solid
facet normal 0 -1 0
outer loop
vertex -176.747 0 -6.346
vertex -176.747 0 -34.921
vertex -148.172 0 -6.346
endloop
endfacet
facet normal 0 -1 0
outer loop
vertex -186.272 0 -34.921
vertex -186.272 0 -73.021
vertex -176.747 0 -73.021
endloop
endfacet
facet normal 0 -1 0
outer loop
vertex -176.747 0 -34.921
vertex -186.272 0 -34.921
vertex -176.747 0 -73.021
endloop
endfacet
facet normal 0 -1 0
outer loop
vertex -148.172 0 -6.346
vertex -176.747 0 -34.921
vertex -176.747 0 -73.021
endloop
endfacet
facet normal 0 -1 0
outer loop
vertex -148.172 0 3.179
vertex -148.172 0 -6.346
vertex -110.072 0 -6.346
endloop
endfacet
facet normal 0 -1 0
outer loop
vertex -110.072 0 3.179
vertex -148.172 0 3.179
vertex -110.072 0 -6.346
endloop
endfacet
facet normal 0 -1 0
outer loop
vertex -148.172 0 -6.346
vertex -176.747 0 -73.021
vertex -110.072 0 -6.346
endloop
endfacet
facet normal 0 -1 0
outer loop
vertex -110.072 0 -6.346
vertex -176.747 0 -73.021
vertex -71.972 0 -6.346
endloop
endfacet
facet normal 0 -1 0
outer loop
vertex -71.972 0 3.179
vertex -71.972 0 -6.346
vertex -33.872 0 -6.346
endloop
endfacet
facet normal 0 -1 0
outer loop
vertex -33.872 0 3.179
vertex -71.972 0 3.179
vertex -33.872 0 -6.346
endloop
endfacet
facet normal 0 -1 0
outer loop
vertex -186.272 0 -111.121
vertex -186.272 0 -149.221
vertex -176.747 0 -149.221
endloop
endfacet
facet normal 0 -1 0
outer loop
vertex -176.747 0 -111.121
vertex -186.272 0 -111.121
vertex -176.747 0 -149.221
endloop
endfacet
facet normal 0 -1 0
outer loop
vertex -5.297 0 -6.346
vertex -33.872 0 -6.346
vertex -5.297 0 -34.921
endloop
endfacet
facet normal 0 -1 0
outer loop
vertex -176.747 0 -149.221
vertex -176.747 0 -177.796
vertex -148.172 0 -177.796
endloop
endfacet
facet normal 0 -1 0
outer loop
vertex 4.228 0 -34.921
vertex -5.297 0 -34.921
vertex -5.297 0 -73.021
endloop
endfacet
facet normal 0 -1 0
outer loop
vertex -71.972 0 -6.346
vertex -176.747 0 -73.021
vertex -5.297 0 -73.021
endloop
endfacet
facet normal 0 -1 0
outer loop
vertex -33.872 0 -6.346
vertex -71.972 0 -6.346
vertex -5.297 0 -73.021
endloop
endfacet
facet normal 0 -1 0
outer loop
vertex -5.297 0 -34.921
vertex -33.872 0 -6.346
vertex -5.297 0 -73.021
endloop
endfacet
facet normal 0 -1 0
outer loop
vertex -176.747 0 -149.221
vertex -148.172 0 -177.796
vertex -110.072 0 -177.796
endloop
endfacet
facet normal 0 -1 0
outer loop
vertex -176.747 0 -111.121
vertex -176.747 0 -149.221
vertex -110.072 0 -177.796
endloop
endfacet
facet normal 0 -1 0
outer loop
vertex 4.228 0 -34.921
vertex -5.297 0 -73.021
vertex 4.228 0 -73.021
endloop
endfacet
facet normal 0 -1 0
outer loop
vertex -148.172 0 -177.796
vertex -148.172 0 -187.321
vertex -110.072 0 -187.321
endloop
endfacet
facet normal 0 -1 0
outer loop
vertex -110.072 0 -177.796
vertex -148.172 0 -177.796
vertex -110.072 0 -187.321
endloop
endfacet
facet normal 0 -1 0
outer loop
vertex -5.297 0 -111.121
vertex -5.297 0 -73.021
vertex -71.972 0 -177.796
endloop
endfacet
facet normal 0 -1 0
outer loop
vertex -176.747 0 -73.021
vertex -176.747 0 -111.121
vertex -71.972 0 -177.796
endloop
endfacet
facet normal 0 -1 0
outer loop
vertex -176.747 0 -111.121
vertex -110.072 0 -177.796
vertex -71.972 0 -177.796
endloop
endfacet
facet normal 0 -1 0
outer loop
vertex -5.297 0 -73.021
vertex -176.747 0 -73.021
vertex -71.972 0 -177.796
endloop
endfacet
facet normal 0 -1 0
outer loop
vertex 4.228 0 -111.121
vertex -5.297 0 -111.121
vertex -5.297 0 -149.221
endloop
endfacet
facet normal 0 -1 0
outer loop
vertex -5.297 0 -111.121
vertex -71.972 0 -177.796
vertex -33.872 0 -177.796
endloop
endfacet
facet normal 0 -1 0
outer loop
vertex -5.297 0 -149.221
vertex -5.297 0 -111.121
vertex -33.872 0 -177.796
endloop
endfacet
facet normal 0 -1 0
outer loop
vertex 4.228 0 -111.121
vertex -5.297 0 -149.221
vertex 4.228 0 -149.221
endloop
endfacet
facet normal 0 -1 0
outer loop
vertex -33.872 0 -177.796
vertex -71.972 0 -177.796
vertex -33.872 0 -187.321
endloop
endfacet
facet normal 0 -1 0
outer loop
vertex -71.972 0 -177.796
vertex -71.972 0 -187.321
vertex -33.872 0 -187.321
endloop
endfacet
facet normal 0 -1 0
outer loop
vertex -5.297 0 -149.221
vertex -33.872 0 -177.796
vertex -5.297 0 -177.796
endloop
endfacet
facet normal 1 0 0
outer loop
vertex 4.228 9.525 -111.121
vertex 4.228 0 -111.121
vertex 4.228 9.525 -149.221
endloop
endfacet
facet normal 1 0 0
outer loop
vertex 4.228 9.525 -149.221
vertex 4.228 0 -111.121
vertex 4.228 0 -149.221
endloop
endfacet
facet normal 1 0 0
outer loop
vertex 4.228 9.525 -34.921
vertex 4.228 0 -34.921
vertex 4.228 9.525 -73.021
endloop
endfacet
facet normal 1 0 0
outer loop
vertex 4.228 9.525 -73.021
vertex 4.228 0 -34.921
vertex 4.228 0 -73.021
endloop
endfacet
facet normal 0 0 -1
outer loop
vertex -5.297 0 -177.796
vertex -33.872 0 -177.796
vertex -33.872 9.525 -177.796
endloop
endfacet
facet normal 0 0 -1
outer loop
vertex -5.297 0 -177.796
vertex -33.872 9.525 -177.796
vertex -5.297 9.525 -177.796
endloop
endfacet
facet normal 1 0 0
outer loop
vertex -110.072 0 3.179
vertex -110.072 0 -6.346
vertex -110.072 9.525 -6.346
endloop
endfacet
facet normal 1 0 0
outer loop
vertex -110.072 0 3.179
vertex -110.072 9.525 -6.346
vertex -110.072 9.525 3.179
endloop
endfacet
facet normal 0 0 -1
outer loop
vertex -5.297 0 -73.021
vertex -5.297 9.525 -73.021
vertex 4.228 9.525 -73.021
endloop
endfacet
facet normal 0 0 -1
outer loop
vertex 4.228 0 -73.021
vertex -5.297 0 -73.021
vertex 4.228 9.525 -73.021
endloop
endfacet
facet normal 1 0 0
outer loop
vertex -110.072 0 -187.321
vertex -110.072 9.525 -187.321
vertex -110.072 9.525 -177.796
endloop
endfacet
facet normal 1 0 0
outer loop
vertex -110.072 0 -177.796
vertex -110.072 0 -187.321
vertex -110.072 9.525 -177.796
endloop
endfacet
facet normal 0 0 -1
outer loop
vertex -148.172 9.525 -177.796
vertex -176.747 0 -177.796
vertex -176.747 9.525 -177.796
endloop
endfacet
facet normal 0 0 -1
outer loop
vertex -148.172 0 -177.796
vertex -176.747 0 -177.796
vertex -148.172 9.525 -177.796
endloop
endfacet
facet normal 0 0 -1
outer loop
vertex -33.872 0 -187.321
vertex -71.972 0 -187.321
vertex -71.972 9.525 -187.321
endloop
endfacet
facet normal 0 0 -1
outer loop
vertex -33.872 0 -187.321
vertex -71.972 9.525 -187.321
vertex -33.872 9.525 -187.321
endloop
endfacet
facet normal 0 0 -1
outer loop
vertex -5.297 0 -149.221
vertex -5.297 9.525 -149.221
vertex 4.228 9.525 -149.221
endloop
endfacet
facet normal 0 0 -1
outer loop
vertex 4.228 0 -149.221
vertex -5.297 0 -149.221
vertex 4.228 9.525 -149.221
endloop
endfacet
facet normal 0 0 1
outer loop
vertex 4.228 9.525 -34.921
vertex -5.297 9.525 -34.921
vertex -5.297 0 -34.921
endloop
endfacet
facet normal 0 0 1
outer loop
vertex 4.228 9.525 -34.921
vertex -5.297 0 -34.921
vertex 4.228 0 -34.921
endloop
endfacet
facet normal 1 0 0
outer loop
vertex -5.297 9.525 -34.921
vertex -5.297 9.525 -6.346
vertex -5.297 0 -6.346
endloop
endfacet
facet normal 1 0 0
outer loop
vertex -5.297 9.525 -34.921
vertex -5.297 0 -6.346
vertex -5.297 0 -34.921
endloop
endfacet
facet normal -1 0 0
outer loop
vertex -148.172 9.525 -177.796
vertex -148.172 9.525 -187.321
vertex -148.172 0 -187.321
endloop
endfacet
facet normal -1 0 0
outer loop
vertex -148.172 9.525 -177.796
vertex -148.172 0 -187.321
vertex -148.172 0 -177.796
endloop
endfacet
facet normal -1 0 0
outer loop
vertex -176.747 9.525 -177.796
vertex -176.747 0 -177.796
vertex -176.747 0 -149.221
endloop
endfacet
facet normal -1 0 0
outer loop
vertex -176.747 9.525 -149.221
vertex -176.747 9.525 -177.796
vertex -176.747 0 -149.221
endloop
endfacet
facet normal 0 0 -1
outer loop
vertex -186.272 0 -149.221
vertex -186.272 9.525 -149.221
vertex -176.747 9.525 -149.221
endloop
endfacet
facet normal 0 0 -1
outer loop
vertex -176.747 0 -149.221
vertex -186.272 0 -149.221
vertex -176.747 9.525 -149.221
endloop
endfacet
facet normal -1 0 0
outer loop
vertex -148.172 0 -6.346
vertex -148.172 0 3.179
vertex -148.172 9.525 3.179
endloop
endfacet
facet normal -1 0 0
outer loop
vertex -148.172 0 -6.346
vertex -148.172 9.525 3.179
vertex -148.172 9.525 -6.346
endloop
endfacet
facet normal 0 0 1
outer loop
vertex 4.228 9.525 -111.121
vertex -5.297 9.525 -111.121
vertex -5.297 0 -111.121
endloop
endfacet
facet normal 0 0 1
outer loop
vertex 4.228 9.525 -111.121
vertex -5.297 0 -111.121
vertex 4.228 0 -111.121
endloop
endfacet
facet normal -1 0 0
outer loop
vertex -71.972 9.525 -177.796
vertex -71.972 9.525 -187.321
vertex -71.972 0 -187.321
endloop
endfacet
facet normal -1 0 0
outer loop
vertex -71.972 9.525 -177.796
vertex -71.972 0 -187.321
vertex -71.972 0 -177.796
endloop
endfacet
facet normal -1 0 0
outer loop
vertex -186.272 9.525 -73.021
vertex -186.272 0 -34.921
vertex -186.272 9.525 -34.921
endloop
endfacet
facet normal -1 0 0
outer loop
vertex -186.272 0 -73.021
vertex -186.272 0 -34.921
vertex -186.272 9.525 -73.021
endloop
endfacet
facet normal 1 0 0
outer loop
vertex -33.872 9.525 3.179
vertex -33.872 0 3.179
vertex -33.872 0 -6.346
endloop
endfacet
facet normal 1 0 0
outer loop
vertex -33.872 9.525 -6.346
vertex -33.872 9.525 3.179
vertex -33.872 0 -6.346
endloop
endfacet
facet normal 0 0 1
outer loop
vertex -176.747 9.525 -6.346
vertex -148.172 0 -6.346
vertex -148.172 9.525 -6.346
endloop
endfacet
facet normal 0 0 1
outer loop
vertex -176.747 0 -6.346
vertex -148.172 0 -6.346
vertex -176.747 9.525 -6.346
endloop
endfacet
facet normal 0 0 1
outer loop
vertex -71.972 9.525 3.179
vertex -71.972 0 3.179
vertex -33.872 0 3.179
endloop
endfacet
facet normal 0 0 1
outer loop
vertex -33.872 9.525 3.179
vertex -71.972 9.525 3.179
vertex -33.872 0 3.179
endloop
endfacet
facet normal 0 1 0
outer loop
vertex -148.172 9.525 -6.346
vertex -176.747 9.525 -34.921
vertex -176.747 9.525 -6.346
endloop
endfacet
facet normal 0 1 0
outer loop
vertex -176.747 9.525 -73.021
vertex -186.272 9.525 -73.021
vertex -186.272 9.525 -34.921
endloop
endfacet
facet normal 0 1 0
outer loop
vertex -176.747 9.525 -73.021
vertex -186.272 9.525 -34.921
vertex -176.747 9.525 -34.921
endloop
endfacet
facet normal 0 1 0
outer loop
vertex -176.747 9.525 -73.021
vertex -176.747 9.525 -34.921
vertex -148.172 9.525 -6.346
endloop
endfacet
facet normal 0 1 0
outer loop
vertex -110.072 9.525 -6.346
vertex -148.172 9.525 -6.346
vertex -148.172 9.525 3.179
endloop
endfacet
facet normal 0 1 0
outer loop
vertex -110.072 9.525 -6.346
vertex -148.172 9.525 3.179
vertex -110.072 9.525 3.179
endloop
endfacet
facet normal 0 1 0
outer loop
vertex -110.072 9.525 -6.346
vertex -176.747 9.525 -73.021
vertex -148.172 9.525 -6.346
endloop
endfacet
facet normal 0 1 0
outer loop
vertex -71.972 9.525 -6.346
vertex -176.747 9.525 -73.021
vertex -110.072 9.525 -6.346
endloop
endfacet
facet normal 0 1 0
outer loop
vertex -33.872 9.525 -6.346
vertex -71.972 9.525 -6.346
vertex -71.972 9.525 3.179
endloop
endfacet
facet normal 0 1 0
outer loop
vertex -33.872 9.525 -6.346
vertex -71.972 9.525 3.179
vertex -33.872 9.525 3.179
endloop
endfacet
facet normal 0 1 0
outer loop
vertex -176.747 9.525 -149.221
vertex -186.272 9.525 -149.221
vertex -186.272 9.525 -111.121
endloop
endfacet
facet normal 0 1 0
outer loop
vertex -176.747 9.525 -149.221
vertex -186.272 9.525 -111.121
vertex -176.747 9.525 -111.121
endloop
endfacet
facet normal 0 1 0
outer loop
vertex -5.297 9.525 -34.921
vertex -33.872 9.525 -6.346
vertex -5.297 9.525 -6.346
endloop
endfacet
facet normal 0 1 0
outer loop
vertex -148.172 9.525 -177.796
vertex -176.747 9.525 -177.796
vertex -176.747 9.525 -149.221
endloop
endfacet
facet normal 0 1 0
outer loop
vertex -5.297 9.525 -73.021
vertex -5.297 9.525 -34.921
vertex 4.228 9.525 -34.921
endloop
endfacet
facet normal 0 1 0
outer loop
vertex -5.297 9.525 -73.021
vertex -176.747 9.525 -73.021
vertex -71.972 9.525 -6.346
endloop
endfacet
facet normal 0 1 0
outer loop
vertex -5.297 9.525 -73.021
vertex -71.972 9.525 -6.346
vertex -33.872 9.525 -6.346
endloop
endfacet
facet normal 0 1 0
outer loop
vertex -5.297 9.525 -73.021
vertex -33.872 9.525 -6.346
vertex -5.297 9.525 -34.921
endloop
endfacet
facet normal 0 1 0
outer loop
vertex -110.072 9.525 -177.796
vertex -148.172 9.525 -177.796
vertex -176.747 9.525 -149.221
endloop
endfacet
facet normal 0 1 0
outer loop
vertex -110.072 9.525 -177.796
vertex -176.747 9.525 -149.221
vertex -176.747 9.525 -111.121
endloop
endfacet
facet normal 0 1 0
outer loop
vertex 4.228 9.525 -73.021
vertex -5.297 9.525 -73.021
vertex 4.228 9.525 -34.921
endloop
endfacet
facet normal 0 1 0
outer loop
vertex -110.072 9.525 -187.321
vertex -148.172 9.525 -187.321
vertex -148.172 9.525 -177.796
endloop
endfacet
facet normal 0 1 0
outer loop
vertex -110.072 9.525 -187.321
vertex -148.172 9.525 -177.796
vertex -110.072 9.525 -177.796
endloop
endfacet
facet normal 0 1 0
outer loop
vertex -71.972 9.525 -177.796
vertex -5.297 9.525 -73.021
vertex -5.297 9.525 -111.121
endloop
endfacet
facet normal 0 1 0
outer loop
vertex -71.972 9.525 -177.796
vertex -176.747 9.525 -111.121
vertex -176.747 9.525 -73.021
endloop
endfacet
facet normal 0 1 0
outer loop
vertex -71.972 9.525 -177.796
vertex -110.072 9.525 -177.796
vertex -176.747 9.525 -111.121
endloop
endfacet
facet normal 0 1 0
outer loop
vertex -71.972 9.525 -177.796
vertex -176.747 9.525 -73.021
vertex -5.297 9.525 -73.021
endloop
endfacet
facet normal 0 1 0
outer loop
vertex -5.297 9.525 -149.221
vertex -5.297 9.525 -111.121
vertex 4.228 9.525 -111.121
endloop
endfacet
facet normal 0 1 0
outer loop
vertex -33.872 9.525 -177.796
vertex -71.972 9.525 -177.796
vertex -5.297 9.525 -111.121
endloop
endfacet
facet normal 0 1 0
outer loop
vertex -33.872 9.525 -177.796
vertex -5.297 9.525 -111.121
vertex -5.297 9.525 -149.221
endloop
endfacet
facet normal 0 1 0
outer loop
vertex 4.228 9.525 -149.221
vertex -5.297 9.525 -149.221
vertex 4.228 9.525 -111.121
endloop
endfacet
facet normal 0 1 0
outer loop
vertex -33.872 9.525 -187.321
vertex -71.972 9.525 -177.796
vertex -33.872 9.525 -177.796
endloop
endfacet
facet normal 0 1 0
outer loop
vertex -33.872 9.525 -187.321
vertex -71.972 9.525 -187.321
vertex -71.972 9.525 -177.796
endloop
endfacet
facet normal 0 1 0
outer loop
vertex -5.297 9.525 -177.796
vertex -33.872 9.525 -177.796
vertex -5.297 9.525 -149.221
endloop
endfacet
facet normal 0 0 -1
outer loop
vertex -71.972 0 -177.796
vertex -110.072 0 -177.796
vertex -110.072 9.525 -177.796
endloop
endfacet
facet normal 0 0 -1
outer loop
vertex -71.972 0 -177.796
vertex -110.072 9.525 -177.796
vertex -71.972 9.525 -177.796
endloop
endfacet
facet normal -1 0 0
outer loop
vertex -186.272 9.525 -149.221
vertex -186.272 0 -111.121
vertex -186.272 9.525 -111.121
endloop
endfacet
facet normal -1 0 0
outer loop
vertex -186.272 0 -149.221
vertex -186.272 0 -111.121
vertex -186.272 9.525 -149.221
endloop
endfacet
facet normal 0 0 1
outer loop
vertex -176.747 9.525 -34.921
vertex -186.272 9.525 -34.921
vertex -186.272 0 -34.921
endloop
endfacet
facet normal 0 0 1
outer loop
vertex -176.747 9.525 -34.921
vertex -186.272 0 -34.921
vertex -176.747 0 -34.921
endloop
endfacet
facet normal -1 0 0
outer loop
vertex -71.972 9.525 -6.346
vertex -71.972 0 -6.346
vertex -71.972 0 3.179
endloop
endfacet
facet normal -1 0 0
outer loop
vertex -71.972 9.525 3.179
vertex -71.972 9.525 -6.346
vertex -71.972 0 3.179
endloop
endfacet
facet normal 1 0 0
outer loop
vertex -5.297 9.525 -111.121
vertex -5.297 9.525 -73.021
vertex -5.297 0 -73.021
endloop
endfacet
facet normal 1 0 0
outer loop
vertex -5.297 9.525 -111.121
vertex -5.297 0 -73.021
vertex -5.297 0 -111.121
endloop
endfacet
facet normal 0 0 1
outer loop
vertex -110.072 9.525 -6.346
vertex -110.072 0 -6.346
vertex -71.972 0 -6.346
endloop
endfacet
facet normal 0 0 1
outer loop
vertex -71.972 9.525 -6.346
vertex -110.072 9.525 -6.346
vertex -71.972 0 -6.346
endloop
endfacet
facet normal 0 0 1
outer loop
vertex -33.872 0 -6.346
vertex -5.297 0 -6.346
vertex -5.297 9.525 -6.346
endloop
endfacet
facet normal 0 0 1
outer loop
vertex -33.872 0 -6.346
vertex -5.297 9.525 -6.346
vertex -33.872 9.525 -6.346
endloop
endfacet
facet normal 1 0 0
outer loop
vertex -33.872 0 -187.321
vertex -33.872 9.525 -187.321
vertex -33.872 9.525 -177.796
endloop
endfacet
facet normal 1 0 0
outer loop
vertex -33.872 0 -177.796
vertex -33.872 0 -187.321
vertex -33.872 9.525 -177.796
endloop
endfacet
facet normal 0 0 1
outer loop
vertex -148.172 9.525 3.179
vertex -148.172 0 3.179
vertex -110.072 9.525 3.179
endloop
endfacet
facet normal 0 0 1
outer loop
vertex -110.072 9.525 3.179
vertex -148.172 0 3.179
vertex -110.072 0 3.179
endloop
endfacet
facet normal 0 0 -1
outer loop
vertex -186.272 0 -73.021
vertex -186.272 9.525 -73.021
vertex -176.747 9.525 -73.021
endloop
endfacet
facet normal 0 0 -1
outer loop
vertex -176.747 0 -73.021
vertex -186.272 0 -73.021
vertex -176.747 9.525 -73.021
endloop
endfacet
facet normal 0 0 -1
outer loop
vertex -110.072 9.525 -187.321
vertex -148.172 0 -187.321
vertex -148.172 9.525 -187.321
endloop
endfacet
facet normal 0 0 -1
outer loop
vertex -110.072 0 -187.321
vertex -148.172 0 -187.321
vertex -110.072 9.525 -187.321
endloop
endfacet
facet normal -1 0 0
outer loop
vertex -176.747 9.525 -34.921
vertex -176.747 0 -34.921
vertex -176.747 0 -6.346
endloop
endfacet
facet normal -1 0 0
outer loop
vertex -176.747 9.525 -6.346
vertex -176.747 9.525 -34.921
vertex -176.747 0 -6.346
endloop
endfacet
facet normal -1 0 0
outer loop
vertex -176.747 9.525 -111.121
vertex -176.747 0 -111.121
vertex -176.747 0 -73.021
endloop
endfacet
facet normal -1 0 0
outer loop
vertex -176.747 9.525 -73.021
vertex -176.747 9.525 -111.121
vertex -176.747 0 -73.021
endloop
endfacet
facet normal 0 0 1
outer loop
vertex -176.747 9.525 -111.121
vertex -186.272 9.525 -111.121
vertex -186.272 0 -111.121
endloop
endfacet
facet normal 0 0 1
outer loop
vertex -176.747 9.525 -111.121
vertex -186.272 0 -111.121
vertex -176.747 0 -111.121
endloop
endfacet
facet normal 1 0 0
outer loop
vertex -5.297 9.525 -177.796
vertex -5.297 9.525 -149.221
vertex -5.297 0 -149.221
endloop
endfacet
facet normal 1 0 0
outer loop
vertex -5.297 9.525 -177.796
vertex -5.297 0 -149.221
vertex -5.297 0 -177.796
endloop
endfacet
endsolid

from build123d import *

# Parameters (mm, degrees)
SKETCH1_W           = 190.5
SKETCH1_H           = 190.5
BOSS_EXTRUDE1_DEPTH = 9.525
SKETCH2_W           = 9.525
SKETCH2_H           = 38.1
CUT_EXTRUDE1_DEPTH  = 9.525
SKETCH3_W           = 9.525
SKETCH3_H           = 38.1
CUT_EXTRUDE2_DEPTH  = 9.525
SKETCH4_W           = 9.525
SKETCH4_H           = 38.1
CUT_EXTRUDE3_DEPTH  = 9.525
SKETCH5_W           = 9.525
SKETCH5_H           = 38.1
CUT_EXTRUDE4_DEPTH  = 9.525
SKETCH6_W           = 9.525
SKETCH6_H           = 38.1
CUT_EXTRUDE5_DEPTH  = 9.525
SKETCH7_W           = 9.525
SKETCH7_H           = 38.1
CUT_EXTRUDE6_DEPTH  = 9.525
SKETCH8_W           = 28.575
SKETCH8_H           = 9.525
CUT_EXTRUDE7_DEPTH  = 9.525
SKETCH9_W           = 38.1
SKETCH9_H           = 9.525
CUT_EXTRUDE8_DEPTH  = 9.525
SKETCH10_W          = 28.575
SKETCH10_H          = 9.525
CUT_EXTRUDE9_DEPTH  = 9.525
SKETCH11_W          = 28.575
SKETCH11_H          = 9.525
CUT_EXTRUDE11_DEPTH = 9.525
SKETCH12_W          = 38.1
SKETCH12_H          = 9.525
CUT_EXTRUDE12_DEPTH = 9.525
SKETCH14_W          = 28.575
SKETCH14_H          = 9.525
CUT_EXTRUDE13_DEPTH = 9.525


with BuildPart() as part:
    # Sketch1 → Boss-Extrude1 (new body)
    with BuildSketch(Plane(origin=(0, 0, 0), x_dir=(1, 0, 0), z_dir=(0, 1, 0))):
        with Locations((-91.022160665, 92.07132964)):
            Rectangle(SKETCH1_W, SKETCH1_H)
    extrude(amount=BOSS_EXTRUDE1_DEPTH)

    # Sketch2 → Cut-Extrude1 (cut)
    with BuildSketch(Plane(origin=(0, 9.525, 0), x_dir=(1, 0, 0), z_dir=(0, 1, 0))):
        with Locations((-0.534660665, 15.87132964)):
            Rectangle(SKETCH2_W, SKETCH2_H)
    extrude(amount=-CUT_EXTRUDE1_DEPTH, mode=Mode.SUBTRACT)

    # Sketch3 → Cut-Extrude2 (cut)
    with BuildSketch(Plane(origin=(0, 9.525, 0), x_dir=(1, 0, 0), z_dir=(0, 1, 0))):
        with Locations((-0.534660665, 92.07132964)):
            Rectangle(SKETCH3_W, SKETCH3_H)
    extrude(amount=-CUT_EXTRUDE2_DEPTH, mode=Mode.SUBTRACT)

    # Sketch4 → Cut-Extrude3 (cut)
    with BuildSketch(Plane(origin=(0, 9.525, 0), x_dir=(1, 0, 0), z_dir=(0, 1, 0))):
        with Locations((-0.534660665, 168.27132964)):
            Rectangle(SKETCH4_W, SKETCH4_H)
    extrude(amount=-CUT_EXTRUDE3_DEPTH, mode=Mode.SUBTRACT)

    # Sketch5 → Cut-Extrude4 (cut)
    with BuildSketch(Plane.XZ):
        with Locations((-181.509660665, -15.87132964)):
            Rectangle(SKETCH5_W, SKETCH5_H)
    extrude(amount=-CUT_EXTRUDE4_DEPTH, mode=Mode.SUBTRACT)

    # Sketch6 → Cut-Extrude5 (cut)
    with BuildSketch(Plane.XZ):
        with Locations((-181.509660665, -92.07132964)):
            Rectangle(SKETCH6_W, SKETCH6_H)
    extrude(amount=-CUT_EXTRUDE5_DEPTH, mode=Mode.SUBTRACT)

    # Sketch7 → Cut-Extrude6 (cut)
    with BuildSketch(Plane.XZ):
        with Locations((-181.509660665, -168.27132964)):
            Rectangle(SKETCH7_W, SKETCH7_H)
    extrude(amount=-CUT_EXTRUDE6_DEPTH, mode=Mode.SUBTRACT)

    # Sketch8 → Cut-Extrude7 (cut)
    with BuildSketch(Plane.XZ):
        with Locations((-19.584660665, -182.55882964)):
            Rectangle(SKETCH8_W, SKETCH8_H)
    extrude(amount=-CUT_EXTRUDE7_DEPTH, mode=Mode.SUBTRACT)

    # Sketch9 → Cut-Extrude8 (cut)
    with BuildSketch(Plane.XZ):
        with Locations((-91.022160665, -182.55882964)):
            Rectangle(SKETCH9_W, SKETCH9_H)
    extrude(amount=-CUT_EXTRUDE8_DEPTH, mode=Mode.SUBTRACT)

    # Sketch10 → Cut-Extrude9 (cut)
    with BuildSketch(Plane.XZ):
        with Locations((-162.459660665, -182.55882964)):
            Rectangle(SKETCH10_W, SKETCH10_H)
    extrude(amount=-CUT_EXTRUDE9_DEPTH, mode=Mode.SUBTRACT)

    # Sketch11 → Cut-Extrude11 (cut)
    with BuildSketch(Plane(origin=(0, 0, 0), x_dir=(-1, 0, 0), z_dir=(0, -1, 0))):
        with Locations((162.459660665, 1.58382964)):
            Rectangle(SKETCH11_W, SKETCH11_H)
    extrude(amount=-CUT_EXTRUDE11_DEPTH, mode=Mode.SUBTRACT)

    # Sketch12 → Cut-Extrude12 (cut)
    with BuildSketch(Plane.XZ):
        with Locations((-91.022160665, -1.58382964)):
            Rectangle(SKETCH12_W, SKETCH12_H)
    extrude(amount=-CUT_EXTRUDE12_DEPTH, mode=Mode.SUBTRACT)

    # Sketch14 → Cut-Extrude13 (cut)
    with BuildSketch(Plane(origin=(0, 0, 0), x_dir=(-1, 0, 0), z_dir=(0, -1, 0))):
        with Locations((19.584660665, 1.58382964)):
            Rectangle(SKETCH14_W, SKETCH14_H)
    extrude(amount=-CUT_EXTRUDE13_DEPTH, mode=Mode.SUBTRACT)


solid = part.part
